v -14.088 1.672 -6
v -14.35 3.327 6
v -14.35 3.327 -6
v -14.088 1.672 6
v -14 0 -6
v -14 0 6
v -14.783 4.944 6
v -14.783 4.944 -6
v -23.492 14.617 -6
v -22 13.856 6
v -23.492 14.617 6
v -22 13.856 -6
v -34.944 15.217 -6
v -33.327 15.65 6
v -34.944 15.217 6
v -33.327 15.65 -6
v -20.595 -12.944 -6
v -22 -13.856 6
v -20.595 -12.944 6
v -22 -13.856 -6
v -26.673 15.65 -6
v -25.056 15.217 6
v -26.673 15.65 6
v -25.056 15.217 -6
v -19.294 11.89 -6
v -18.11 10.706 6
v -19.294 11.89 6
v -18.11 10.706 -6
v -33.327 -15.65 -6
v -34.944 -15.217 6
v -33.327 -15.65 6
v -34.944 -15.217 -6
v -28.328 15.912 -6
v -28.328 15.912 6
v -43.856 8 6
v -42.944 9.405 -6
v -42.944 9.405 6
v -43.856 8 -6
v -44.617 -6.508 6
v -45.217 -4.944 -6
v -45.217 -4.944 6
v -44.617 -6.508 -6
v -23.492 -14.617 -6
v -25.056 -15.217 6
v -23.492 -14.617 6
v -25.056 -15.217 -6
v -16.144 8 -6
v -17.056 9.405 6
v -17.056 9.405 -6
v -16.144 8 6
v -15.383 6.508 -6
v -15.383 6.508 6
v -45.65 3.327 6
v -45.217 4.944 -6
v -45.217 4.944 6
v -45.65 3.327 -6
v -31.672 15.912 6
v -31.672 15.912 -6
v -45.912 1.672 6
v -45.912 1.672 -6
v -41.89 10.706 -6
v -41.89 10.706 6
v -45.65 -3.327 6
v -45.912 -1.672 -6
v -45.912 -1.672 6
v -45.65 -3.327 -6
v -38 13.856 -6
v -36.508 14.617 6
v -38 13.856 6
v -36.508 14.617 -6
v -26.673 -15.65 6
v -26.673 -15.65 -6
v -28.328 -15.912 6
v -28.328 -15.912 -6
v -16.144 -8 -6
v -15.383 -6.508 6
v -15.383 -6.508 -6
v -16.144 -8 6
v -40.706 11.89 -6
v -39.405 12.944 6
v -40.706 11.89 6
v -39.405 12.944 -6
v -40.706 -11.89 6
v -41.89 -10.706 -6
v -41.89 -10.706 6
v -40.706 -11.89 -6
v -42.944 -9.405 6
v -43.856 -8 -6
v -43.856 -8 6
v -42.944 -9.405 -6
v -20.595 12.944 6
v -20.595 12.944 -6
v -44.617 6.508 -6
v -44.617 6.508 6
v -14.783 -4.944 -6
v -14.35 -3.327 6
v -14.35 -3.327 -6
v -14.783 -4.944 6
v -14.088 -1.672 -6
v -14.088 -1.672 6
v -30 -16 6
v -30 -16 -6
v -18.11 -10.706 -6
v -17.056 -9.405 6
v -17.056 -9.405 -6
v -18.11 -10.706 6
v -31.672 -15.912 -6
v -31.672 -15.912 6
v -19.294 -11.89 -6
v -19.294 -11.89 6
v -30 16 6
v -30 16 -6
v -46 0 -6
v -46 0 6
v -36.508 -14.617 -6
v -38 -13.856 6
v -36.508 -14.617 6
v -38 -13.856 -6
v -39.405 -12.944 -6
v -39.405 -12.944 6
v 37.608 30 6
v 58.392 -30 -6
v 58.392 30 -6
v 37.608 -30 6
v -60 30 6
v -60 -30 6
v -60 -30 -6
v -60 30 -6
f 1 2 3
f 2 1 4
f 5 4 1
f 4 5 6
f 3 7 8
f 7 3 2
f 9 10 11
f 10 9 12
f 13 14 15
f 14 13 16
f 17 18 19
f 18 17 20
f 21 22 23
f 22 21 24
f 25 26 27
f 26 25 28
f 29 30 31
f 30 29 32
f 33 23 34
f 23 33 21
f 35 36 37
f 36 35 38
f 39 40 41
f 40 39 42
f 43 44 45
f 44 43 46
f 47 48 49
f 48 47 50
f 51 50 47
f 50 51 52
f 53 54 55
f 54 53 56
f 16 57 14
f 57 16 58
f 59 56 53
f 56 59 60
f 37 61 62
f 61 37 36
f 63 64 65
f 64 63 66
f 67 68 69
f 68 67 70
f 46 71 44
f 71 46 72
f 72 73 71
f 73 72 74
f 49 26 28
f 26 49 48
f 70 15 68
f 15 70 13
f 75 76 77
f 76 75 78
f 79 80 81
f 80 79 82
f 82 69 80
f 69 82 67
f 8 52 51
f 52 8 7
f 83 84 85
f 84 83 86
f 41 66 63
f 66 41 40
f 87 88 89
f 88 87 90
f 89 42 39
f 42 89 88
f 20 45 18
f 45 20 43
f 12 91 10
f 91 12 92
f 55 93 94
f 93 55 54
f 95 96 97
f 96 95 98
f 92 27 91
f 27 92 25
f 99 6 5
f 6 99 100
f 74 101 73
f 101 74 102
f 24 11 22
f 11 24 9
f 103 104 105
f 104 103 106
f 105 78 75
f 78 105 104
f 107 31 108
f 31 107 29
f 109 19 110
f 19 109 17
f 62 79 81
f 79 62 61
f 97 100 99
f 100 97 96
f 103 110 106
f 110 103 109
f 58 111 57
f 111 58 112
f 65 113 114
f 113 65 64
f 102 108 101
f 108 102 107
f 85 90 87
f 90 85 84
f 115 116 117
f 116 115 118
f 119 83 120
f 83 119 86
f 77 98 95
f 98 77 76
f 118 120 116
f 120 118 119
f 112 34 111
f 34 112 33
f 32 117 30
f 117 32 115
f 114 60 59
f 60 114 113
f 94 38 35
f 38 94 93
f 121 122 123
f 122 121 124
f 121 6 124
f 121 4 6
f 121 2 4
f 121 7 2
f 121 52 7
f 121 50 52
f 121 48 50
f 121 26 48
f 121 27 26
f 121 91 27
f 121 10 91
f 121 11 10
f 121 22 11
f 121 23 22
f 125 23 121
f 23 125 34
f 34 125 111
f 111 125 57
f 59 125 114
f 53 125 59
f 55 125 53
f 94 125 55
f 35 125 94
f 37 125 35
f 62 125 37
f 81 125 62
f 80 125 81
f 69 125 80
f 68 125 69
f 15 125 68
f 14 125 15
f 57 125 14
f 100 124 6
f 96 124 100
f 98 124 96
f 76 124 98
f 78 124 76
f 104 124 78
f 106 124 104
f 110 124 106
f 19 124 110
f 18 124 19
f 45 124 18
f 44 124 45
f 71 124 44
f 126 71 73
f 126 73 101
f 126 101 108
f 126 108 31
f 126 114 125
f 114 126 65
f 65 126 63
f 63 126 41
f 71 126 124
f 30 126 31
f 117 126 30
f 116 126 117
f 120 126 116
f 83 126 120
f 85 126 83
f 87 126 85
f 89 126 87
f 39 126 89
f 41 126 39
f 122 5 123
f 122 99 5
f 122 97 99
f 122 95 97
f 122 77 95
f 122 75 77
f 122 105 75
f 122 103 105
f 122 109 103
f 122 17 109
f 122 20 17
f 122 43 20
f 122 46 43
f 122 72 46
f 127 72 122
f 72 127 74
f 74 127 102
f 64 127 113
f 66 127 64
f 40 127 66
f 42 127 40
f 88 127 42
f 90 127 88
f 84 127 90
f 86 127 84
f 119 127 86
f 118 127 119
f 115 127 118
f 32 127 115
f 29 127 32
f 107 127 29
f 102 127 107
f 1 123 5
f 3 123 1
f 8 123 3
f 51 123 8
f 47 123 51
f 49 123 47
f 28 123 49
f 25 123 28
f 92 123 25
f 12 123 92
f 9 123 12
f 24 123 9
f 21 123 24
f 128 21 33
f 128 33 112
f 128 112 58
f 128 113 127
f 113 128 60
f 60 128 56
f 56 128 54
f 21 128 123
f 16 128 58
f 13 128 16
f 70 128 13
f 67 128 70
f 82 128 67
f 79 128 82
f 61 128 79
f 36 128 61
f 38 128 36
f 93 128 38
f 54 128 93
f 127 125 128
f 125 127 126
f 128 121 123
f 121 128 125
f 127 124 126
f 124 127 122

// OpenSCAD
x=120;
y=60;
z=12;
radi=16;
grad=0; //-30
difference(){
cube([x,y,z],true);
union(){
translate([-x/4,0,0])color([1,0,0])rotate([0,grad,0])
cylinder(h=z*4,r=radi,center=true,$fn=60);
translate([x/2,0,0])rotate([0,30,0])cube([x,y*1.1,z],true);
}
}
